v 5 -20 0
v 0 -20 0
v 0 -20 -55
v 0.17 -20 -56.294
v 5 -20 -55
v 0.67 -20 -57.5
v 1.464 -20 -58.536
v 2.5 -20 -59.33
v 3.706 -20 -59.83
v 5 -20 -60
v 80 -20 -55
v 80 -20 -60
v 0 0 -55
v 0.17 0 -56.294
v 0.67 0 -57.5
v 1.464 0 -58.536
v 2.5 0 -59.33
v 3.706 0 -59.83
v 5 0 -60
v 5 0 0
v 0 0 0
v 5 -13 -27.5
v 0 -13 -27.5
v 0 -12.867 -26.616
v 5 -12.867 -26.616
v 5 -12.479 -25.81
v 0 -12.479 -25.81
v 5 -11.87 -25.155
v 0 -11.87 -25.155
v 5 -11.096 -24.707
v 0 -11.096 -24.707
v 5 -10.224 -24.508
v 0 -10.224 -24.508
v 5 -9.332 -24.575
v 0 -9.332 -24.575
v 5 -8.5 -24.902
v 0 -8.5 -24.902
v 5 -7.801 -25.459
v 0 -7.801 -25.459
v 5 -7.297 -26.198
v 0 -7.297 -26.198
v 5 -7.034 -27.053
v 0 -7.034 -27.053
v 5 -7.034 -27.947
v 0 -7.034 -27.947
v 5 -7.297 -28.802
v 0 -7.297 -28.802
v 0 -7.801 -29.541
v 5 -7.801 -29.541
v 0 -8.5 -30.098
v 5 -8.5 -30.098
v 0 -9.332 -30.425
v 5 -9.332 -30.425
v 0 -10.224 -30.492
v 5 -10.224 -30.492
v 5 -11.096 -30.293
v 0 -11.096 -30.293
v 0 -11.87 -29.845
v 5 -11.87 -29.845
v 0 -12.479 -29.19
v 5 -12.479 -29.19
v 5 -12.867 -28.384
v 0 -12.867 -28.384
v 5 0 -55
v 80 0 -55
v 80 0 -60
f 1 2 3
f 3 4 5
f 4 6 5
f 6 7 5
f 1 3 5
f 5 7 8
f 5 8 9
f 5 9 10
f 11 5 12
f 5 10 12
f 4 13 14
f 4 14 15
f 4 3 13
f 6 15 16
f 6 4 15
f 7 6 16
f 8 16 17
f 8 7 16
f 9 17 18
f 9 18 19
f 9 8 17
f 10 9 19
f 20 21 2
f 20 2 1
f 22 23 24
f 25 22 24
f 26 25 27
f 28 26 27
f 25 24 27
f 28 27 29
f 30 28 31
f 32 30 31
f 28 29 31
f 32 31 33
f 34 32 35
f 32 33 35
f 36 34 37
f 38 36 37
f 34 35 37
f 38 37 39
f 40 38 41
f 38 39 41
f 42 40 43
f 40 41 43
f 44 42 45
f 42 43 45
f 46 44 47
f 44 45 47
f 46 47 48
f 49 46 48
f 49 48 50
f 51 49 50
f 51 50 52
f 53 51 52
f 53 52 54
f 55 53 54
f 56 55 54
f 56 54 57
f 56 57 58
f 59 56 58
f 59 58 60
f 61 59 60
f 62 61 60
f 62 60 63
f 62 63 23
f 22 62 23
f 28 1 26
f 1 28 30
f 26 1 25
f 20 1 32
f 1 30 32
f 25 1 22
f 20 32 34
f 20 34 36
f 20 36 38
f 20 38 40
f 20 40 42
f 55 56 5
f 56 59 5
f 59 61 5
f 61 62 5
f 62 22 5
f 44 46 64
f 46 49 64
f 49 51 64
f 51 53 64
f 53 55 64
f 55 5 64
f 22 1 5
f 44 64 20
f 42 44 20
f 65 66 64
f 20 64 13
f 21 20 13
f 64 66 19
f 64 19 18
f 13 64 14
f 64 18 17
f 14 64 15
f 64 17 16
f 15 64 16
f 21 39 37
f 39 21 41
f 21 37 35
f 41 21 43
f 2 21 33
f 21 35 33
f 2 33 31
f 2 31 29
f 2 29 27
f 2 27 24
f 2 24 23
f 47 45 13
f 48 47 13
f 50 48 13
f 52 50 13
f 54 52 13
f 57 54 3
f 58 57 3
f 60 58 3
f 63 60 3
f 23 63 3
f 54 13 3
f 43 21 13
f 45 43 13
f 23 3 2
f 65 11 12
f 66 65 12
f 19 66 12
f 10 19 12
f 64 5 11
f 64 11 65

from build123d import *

# Parameters (mm, degrees)
F0_W = 5
F0_H = 20
F4_D = 6


with BuildPart() as f2:
    # F2: sweep along a path in F1
    with BuildLine(Plane.XZ) as f2_path:
        Line((0, 0), (0, -55))
        ThreePointArc((0, -55), (1.4644660941, -58.5355339059), (5, -60))
        Line((5, -60), (80, -60))
    # F0 (on Top) → F2 (sweep)
    with BuildSketch(Plane.XY):
        with Locations((2.5, -10)):
            Rectangle(F0_W, F0_H)
    sweep(path=f2_path.line)

    # F4 (through all)
    with Locations(Plane.YZ.offset(5)):
        with Locations((-10, -27.5)):
            Hole(F4_D / 2)


solid = f2.part
